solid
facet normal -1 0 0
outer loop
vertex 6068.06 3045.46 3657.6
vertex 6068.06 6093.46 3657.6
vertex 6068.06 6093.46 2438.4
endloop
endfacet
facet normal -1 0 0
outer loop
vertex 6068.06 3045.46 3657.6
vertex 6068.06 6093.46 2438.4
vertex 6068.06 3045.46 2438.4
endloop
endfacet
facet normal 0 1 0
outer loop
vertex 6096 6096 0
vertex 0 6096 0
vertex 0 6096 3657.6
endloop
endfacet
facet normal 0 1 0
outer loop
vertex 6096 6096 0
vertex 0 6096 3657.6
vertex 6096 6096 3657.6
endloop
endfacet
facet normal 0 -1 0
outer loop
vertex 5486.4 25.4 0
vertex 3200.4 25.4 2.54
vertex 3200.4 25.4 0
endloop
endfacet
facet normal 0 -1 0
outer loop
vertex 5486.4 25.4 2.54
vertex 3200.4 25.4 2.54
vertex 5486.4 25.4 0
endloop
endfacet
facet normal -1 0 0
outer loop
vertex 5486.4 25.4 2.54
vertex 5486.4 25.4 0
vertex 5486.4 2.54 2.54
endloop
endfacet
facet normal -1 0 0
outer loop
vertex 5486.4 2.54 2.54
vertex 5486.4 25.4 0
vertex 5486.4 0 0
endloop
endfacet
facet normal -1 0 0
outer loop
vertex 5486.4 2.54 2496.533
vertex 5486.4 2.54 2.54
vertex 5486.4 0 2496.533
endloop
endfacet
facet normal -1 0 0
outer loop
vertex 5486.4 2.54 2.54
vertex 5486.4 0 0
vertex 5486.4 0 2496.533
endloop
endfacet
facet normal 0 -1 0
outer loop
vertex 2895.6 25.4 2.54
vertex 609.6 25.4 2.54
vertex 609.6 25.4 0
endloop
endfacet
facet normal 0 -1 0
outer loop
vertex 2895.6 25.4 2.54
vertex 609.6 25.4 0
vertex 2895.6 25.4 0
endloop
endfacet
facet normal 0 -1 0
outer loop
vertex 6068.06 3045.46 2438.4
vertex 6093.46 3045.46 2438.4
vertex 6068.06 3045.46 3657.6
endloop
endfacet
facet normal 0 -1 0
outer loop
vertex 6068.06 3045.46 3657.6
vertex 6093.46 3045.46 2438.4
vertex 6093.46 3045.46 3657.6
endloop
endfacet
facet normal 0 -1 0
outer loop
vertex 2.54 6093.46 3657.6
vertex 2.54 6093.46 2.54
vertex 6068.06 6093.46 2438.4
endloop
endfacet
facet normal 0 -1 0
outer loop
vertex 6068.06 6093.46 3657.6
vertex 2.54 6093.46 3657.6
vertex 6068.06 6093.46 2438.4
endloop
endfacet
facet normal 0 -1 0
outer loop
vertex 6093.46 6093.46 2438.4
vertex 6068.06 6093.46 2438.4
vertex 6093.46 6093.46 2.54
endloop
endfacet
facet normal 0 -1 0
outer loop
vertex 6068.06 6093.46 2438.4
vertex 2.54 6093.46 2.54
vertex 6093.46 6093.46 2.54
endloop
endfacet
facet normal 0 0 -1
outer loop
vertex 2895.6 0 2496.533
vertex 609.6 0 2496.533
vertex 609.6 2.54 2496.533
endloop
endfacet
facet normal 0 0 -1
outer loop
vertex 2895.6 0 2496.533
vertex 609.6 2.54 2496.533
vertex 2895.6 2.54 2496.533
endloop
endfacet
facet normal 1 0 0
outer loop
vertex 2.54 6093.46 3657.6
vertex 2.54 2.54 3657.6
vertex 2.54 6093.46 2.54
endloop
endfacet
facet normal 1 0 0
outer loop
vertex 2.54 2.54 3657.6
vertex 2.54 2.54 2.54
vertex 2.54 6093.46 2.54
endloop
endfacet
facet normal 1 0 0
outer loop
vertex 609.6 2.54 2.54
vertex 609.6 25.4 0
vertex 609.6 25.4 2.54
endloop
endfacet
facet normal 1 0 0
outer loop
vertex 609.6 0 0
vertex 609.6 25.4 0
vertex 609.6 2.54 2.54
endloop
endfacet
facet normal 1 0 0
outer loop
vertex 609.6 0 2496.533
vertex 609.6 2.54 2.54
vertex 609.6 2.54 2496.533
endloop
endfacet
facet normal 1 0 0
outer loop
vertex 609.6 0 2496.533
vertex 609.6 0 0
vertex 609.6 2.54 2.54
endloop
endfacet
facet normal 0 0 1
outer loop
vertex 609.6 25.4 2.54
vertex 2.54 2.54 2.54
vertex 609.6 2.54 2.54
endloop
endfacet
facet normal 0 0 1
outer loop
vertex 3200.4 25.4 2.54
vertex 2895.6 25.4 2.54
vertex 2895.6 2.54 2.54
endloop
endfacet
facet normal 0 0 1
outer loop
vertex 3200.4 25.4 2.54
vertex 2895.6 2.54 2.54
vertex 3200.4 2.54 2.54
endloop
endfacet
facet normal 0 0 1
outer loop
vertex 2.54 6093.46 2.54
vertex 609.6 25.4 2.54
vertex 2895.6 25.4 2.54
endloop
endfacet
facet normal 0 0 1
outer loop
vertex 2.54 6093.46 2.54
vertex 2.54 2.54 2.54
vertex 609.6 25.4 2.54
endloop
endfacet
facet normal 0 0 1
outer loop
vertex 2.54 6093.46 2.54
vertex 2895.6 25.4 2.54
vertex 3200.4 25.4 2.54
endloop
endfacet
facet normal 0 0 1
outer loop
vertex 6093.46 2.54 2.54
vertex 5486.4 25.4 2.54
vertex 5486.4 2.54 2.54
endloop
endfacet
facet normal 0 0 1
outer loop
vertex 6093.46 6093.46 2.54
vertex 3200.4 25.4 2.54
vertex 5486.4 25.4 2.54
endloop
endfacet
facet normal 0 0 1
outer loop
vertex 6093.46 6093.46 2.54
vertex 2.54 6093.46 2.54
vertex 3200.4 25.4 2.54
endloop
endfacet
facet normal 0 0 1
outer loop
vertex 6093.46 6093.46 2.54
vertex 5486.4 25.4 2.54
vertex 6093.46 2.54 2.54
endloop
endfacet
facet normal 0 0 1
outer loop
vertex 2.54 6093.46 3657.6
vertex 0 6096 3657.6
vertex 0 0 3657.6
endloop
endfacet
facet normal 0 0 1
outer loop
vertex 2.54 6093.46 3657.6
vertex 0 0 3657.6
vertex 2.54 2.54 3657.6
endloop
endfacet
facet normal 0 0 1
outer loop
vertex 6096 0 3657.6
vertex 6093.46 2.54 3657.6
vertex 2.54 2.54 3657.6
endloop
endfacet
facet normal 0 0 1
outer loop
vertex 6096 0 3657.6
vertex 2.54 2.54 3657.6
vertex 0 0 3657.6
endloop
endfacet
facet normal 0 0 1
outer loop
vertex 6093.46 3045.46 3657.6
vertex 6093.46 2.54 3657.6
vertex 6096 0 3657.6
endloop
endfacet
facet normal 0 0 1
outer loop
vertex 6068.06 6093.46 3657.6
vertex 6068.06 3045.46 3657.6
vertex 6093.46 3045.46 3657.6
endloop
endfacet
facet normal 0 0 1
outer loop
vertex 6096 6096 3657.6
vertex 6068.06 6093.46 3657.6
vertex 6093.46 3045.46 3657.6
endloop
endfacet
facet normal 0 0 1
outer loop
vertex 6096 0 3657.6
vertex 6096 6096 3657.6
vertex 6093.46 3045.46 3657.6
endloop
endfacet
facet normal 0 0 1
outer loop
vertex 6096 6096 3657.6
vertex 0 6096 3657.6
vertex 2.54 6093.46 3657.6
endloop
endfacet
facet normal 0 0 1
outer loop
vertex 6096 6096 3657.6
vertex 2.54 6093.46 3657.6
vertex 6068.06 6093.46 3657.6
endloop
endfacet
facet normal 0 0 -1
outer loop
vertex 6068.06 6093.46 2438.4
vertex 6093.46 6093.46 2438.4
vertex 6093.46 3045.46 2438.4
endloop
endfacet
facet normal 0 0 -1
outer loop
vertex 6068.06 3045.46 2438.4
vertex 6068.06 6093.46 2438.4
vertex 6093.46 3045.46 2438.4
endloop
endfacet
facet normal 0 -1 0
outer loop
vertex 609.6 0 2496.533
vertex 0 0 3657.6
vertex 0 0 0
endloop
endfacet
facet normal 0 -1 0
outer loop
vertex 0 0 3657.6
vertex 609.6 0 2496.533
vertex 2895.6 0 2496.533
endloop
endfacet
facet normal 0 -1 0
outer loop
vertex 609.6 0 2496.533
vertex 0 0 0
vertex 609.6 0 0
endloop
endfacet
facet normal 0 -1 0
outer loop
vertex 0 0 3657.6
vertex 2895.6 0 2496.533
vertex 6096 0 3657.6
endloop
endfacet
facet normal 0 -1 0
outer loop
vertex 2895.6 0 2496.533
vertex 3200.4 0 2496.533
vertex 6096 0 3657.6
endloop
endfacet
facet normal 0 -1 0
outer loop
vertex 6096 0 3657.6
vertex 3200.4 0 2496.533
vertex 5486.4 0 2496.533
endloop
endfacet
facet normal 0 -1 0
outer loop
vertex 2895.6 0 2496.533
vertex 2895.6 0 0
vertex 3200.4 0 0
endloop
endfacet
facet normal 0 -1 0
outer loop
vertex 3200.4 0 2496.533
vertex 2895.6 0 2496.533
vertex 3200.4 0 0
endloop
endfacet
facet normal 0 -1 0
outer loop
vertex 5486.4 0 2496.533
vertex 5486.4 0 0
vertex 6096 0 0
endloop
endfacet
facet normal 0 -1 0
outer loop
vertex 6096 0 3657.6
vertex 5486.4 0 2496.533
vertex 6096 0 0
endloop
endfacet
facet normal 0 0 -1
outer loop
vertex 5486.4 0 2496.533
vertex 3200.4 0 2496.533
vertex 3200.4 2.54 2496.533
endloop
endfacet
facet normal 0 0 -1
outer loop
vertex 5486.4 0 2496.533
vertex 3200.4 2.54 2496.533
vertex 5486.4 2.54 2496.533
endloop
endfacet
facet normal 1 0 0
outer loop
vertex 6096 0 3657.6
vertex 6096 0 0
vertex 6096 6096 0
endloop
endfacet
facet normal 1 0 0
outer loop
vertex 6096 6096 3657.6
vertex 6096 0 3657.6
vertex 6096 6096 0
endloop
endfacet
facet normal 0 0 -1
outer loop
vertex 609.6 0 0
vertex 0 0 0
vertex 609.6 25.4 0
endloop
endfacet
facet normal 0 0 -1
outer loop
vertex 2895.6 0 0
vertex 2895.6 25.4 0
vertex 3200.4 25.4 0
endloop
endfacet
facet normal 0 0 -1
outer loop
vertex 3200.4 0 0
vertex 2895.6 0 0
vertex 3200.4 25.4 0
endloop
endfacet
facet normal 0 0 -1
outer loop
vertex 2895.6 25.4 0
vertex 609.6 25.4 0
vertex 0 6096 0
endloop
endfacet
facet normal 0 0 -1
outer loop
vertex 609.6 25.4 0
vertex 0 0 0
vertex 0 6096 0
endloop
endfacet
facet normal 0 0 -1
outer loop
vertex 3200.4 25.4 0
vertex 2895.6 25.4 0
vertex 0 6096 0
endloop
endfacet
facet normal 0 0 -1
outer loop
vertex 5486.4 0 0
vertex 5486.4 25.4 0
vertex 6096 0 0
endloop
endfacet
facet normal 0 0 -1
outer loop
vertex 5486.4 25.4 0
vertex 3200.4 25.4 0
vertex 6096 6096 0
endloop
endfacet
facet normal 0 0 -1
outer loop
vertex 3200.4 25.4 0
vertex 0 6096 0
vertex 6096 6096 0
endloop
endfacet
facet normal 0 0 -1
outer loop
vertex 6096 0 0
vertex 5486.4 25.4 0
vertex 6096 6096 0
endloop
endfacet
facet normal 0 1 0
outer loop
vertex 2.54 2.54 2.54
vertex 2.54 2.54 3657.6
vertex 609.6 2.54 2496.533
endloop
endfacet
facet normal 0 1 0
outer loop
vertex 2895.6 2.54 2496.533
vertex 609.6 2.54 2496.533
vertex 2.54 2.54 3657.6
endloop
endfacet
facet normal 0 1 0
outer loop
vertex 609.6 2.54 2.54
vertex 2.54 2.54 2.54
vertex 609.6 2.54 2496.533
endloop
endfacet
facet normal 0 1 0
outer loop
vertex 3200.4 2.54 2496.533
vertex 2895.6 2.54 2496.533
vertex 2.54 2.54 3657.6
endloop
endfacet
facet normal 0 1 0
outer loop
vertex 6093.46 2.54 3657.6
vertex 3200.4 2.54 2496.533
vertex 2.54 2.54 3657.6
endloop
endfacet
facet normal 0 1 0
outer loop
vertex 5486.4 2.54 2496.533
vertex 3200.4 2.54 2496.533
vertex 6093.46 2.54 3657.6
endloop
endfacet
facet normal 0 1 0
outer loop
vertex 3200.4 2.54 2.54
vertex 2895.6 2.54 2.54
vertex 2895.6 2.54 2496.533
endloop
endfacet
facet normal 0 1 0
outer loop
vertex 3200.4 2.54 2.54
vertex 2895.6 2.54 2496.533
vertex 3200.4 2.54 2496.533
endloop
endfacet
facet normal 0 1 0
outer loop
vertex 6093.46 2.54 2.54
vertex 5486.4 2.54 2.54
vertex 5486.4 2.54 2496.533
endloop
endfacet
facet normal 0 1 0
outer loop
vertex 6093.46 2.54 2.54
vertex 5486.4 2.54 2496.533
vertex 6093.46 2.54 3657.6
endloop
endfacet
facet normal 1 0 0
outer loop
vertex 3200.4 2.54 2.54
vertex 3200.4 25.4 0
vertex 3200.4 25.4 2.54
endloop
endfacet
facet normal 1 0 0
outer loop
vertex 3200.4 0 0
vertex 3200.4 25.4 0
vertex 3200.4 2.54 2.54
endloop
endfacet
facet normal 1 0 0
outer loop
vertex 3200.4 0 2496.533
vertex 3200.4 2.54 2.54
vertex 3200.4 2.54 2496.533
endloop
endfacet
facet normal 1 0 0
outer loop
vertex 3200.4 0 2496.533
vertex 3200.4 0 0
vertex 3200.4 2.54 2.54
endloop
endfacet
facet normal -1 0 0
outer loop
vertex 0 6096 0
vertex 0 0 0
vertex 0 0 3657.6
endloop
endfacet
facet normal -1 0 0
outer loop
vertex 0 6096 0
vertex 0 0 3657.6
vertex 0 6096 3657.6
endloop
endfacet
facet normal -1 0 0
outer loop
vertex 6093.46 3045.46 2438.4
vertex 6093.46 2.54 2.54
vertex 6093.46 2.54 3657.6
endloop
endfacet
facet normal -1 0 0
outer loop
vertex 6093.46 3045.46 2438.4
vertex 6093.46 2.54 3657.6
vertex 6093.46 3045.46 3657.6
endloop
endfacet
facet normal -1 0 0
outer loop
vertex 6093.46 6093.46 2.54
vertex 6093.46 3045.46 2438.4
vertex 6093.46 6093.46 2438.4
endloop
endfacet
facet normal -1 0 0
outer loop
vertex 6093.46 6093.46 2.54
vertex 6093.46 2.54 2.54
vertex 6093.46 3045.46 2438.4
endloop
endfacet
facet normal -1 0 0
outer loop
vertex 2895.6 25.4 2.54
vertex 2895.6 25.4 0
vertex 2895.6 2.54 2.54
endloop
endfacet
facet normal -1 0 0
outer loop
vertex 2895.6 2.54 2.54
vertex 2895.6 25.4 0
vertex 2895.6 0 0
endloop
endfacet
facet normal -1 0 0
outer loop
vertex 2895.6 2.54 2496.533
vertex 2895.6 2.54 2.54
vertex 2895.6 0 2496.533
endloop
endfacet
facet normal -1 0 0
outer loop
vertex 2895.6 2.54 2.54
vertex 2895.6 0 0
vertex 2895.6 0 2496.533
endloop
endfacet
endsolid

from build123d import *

# Parameters (mm, degrees)
F0_W     = 6096
F0_H     = 6096
F1_DEPTH = 3657.6
F2_T     = -2.54
F3_W     = 2286
F3_H     = 2496.532917
F4_DEPTH = 25.4
F5_W     = 3048
F5_H     = 1219.2
F6_DEPTH = 25.4


with BuildPart() as f1:
    # F0 (on Top) → F1 (new body)
    with BuildSketch(Plane.XY):
        with Locations((3048, 3048)):
            Rectangle(F0_W, F0_H)
    extrude(amount=F1_DEPTH)

    # F2
    f2_openings = [f1.faces().sort_by_distance(p)[0] for p in [
        (3048, 3048, 3657.6),
    ]]
    offset(amount=F2_T, openings=f2_openings)

    # F3 (on face) → F4 (cut)
    with BuildSketch(Plane.XZ):
        with Locations((1752.6, 1248.266458)):
            Rectangle(F3_W, F3_H)
        with Locations((4343.4, 1248.266458)):
            Rectangle(F3_W, F3_H)
    extrude(amount=-F4_DEPTH, mode=Mode.SUBTRACT)

    # F5 (on face) → F6 (join)
    with BuildSketch(Plane(origin=(6093.46, 0, 0), x_dir=(0, -1, 0), z_dir=(-1, 0, 0))):
        with Locations((-4569.46, 3048)):
            Rectangle(F5_W, F5_H)
    extrude(amount=F6_DEPTH)


solid = f1.part
